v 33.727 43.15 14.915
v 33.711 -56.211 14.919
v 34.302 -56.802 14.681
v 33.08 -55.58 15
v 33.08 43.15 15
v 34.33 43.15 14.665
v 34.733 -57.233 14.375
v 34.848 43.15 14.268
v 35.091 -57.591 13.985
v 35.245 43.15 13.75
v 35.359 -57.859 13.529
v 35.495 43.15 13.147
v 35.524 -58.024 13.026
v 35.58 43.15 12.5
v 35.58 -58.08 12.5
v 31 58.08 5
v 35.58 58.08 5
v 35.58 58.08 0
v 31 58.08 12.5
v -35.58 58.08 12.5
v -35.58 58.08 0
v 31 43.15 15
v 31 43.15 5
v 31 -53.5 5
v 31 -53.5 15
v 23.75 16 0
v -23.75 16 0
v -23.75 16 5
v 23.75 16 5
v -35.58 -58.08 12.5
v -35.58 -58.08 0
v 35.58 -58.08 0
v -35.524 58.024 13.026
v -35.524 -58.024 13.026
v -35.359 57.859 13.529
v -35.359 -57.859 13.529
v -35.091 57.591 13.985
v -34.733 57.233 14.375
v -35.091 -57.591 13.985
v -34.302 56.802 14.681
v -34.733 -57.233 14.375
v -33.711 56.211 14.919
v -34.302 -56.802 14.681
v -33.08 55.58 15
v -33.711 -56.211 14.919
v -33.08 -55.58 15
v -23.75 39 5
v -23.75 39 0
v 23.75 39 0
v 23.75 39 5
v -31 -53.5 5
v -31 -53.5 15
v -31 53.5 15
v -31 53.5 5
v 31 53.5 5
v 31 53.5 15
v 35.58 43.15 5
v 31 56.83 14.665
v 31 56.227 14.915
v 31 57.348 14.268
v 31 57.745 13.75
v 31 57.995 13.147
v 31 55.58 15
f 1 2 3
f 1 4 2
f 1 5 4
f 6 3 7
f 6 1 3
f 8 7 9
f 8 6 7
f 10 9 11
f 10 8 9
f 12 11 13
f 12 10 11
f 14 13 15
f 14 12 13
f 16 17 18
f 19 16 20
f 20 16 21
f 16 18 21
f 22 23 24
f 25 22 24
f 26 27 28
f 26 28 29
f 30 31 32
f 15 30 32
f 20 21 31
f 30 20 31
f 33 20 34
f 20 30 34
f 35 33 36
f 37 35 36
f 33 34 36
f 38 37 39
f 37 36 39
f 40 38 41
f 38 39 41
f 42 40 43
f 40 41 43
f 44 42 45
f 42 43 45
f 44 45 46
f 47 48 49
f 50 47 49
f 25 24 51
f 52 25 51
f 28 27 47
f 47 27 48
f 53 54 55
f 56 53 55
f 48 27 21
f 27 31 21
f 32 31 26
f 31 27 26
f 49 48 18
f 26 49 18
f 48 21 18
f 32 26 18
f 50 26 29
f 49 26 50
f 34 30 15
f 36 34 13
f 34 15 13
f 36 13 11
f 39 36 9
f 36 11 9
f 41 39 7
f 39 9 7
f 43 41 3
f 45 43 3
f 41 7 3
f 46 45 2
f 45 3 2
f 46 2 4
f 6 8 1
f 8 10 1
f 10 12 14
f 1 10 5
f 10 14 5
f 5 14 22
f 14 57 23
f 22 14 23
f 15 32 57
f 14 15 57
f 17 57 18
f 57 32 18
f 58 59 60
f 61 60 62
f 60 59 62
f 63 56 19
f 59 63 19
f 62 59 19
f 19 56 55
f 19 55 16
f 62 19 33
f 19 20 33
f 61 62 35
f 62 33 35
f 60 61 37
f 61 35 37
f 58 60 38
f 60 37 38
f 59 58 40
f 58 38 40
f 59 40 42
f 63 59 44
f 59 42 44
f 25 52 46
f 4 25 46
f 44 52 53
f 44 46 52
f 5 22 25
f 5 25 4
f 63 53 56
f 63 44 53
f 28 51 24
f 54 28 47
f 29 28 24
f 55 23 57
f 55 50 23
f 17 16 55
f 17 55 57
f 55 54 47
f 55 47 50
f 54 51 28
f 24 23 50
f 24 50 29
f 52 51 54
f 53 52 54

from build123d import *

# Parameters (mm, degrees)
F0_W     = 47.5
F0_H     = 23
F1_DEPTH = 5
F2_DEPTH = 15
F3_R     = 2.5


with BuildPart() as f1:
    # F0 (on Top) → F1 (new body)
    with BuildSketch(Plane.XY):
        Polygon((35.5799995661, 43.7052872479), (35.5799995661, 58.0799995661), (31, 58.0799995661), (31, 53.5), (31, 43.15), (35.5799995661, 43.15), align=None)
        Polygon((31, 53.5), (31, 58.0799995661), (-35.5799995661, 58.0799995661), (-35.5799995661, -58.0799995661), (35.5799995661, -58.0799995661), (35.5799995661, 43.15), (31, 43.15), (31, -53.5), (-31, -53.5), (-31, 53.5), align=None)
        Polygon((31, 43.15), (31, 53.5), (-31, 53.5), (-31, -53.5), (31, -53.5), align=None)
        with Locations((0, 27.5)):
            Rectangle(F0_W, F0_H, mode=Mode.SUBTRACT)
    extrude(amount=F1_DEPTH)

    # F0 (on Top) → F2 (join)
    with BuildSketch(Plane.XY):
        Polygon((31, 53.5), (31, 58.0799995661), (-35.5799995661, 58.0799995661), (-35.5799995661, -58.0799995661), (35.5799995661, -58.0799995661), (35.5799995661, 43.15), (31, 43.15), (31, -53.5), (-31, -53.5), (-31, 53.5), align=None)
    extrude(amount=F2_DEPTH)

    # F3
    f3_edges = [f1.edges().sort_by_distance(p)[0] for p in [
        (-35.58, 0, 15),
        (-2.29, 58.08, 15),
        (0, -58.08, 15),
        (35.58, -7.465, 15),
    ]]
    fillet(f3_edges, radius=F3_R)


solid = f1.part
